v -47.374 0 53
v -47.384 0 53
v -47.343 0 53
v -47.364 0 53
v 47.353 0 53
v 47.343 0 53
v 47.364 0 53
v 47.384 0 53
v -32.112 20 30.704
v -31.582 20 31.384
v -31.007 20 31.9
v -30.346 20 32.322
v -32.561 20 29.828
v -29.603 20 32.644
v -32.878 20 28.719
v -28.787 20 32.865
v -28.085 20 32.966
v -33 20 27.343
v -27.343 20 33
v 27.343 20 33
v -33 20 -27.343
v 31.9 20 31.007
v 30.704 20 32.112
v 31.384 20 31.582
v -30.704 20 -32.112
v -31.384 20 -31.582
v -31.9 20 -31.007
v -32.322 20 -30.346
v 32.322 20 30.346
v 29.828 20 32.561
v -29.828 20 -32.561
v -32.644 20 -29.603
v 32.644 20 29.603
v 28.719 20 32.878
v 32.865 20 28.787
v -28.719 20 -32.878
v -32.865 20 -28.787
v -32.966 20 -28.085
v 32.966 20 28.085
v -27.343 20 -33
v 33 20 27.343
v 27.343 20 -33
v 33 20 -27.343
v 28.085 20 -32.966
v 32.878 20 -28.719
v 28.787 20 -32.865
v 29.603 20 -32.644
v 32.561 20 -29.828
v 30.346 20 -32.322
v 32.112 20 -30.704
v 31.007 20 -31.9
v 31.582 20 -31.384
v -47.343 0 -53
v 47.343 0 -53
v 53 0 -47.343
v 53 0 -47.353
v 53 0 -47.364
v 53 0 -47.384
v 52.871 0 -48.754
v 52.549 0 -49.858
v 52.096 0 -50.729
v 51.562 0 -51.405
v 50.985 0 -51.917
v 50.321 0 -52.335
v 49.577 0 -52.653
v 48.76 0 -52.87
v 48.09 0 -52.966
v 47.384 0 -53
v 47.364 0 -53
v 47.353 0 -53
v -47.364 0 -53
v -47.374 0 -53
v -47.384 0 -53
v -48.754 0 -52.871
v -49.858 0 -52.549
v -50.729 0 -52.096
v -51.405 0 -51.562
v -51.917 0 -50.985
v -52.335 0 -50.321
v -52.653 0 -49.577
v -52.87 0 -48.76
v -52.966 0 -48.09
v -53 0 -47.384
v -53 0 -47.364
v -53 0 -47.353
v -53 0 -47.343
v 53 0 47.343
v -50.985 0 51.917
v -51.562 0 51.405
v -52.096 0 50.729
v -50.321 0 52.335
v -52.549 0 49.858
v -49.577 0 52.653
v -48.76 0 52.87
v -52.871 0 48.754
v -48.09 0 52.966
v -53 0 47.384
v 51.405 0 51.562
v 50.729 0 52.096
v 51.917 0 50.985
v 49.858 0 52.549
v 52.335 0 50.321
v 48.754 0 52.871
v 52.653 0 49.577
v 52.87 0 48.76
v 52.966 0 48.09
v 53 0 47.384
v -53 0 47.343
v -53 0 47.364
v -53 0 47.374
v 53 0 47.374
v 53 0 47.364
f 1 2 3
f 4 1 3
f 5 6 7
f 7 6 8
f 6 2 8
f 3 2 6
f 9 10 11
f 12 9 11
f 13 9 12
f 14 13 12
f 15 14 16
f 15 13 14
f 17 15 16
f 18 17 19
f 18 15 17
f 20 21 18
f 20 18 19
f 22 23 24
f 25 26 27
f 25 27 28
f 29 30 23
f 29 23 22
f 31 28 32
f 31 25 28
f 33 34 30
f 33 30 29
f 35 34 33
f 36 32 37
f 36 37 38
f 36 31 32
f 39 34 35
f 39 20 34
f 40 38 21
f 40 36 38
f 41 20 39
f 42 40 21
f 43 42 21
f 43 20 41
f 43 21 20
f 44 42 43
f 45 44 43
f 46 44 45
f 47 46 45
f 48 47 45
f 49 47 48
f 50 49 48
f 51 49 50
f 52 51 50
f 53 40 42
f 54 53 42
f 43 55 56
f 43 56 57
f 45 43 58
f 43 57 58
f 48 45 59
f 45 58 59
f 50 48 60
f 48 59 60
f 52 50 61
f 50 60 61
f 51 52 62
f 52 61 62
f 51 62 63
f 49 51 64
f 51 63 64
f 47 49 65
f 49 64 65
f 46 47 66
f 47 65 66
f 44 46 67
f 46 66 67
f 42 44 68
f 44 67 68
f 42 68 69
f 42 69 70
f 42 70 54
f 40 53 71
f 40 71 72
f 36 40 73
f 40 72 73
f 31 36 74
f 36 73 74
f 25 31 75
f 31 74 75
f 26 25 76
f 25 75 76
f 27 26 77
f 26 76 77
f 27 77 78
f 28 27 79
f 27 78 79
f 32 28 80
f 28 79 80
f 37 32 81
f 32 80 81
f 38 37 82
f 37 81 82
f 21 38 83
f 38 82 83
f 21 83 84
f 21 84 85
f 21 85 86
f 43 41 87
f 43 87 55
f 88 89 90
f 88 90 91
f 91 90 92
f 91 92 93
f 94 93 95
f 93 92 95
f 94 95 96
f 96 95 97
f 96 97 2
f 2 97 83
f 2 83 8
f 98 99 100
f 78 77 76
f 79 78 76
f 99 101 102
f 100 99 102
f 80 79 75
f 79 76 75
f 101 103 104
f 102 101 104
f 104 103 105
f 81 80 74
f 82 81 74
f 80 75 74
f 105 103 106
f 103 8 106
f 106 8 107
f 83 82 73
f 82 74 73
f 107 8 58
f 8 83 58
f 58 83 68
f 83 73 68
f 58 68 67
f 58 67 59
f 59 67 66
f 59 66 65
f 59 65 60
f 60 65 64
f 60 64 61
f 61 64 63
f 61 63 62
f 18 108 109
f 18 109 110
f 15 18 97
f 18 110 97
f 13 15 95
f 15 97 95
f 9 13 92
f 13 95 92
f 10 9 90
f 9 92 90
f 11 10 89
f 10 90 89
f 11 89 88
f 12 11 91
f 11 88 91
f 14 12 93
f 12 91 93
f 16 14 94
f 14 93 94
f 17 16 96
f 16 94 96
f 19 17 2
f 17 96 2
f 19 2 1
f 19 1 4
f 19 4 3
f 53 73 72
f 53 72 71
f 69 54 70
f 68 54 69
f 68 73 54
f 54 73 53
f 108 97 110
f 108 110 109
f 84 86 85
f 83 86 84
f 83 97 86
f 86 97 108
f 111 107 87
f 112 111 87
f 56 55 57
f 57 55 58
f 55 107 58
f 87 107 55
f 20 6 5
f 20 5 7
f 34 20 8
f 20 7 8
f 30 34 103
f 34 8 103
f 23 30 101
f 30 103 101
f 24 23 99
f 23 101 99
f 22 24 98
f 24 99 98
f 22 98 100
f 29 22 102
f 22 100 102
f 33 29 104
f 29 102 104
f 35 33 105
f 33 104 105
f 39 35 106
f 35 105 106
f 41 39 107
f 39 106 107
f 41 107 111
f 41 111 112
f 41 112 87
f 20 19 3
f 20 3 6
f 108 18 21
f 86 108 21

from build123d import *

# Parameters (mm, degrees)
SKETCH1_W           = 106
SKETCH1_H           = 106
BOSS_EXTRUDE1_DEPTH = 20
CHAMFER3_SIZE       = 20
FILLET1_R           = 8


# Some blends are built 0.0001 mm under size
with BuildPart() as part:
    # Sketch1 → Boss-Extrude1 (new body)
    with BuildSketch(Plane(origin=(0, 0, 0), x_dir=(1, 0, 0), z_dir=(0, 1, 0))):
        Rectangle(SKETCH1_W, SKETCH1_H)
    extrude(amount=BOSS_EXTRUDE1_DEPTH)

    # Chamfer3
    chamfer3_edges = [part.edges().sort_by_distance(p)[0] for p in [
        (-53, 20, 0),
        (0, 20, -53),
        (53, 20, 0),
        (0, 20, 53),
    ]]
    chamfer(chamfer3_edges, length=CHAMFER3_SIZE - 0.0001)  # a hair under: the kernel refuses the full size

    # Fillet1
    # the kernel refuses this fillet: 8 mm, written as the material it takes off along each edge
    with BuildSketch(Plane(origin=(59.666666667, -6.666566667, -59.666666667), x_dir=(-0.8164965809277259, -0.4082482904638644, -0.40824829046386174), z_dir=(-0.5773502691896258, 0.5773502691896258, 0.5773502691896256)), Plane(origin=(59.666666667, -6.666566667, 59.666666667), x_dir=(0.40824829046386324, -0.40824829046386285, -0.8164965809277259), z_dir=(-0.5773502691896257, 0.577350269189626, -0.577350269189626))) as fillet1_piece_1:
        with BuildLine():
            CenterArc((FILLET1_R * 0.57735026919, FILLET1_R), FILLET1_R, 210, 60)
            Line((-FILLET1_R * 0.288675134595, FILLET1_R * 0.5), (0, 0))
            Line((0, 0), (FILLET1_R * 0.57735026919, 0))
        make_face()
    extrude(amount=57.734853714, mode=Mode.SUBTRACT)
    with BuildSketch(Plane(origin=(-59.666666667, -6.666566667, -59.666666667), x_dir=(0.8164965809277261, -0.4082482904638631, -0.4082482904638627), z_dir=(0.5773502691896256, 0.5773502691896257, 0.577350269189626)), Plane(origin=(-59.666666667, -6.666566667, 59.666666667), x_dir=(-0.4082482904638621, -0.40824829046386396, -0.816496580927726), z_dir=(0.5773502691896257, 0.5773502691896258, -0.5773502691896257))) as fillet1_piece_2:
        with BuildLine():
            CenterArc((FILLET1_R * 0.57735026919, -FILLET1_R), FILLET1_R, 90, 60)
            Line((-FILLET1_R * 0.288675134595, -FILLET1_R * 0.5), (0, 0))
            Line((0, 0), (FILLET1_R * 0.57735026919, 0))
        make_face()
    extrude(amount=57.734853714, mode=Mode.SUBTRACT)


solid = part.part
